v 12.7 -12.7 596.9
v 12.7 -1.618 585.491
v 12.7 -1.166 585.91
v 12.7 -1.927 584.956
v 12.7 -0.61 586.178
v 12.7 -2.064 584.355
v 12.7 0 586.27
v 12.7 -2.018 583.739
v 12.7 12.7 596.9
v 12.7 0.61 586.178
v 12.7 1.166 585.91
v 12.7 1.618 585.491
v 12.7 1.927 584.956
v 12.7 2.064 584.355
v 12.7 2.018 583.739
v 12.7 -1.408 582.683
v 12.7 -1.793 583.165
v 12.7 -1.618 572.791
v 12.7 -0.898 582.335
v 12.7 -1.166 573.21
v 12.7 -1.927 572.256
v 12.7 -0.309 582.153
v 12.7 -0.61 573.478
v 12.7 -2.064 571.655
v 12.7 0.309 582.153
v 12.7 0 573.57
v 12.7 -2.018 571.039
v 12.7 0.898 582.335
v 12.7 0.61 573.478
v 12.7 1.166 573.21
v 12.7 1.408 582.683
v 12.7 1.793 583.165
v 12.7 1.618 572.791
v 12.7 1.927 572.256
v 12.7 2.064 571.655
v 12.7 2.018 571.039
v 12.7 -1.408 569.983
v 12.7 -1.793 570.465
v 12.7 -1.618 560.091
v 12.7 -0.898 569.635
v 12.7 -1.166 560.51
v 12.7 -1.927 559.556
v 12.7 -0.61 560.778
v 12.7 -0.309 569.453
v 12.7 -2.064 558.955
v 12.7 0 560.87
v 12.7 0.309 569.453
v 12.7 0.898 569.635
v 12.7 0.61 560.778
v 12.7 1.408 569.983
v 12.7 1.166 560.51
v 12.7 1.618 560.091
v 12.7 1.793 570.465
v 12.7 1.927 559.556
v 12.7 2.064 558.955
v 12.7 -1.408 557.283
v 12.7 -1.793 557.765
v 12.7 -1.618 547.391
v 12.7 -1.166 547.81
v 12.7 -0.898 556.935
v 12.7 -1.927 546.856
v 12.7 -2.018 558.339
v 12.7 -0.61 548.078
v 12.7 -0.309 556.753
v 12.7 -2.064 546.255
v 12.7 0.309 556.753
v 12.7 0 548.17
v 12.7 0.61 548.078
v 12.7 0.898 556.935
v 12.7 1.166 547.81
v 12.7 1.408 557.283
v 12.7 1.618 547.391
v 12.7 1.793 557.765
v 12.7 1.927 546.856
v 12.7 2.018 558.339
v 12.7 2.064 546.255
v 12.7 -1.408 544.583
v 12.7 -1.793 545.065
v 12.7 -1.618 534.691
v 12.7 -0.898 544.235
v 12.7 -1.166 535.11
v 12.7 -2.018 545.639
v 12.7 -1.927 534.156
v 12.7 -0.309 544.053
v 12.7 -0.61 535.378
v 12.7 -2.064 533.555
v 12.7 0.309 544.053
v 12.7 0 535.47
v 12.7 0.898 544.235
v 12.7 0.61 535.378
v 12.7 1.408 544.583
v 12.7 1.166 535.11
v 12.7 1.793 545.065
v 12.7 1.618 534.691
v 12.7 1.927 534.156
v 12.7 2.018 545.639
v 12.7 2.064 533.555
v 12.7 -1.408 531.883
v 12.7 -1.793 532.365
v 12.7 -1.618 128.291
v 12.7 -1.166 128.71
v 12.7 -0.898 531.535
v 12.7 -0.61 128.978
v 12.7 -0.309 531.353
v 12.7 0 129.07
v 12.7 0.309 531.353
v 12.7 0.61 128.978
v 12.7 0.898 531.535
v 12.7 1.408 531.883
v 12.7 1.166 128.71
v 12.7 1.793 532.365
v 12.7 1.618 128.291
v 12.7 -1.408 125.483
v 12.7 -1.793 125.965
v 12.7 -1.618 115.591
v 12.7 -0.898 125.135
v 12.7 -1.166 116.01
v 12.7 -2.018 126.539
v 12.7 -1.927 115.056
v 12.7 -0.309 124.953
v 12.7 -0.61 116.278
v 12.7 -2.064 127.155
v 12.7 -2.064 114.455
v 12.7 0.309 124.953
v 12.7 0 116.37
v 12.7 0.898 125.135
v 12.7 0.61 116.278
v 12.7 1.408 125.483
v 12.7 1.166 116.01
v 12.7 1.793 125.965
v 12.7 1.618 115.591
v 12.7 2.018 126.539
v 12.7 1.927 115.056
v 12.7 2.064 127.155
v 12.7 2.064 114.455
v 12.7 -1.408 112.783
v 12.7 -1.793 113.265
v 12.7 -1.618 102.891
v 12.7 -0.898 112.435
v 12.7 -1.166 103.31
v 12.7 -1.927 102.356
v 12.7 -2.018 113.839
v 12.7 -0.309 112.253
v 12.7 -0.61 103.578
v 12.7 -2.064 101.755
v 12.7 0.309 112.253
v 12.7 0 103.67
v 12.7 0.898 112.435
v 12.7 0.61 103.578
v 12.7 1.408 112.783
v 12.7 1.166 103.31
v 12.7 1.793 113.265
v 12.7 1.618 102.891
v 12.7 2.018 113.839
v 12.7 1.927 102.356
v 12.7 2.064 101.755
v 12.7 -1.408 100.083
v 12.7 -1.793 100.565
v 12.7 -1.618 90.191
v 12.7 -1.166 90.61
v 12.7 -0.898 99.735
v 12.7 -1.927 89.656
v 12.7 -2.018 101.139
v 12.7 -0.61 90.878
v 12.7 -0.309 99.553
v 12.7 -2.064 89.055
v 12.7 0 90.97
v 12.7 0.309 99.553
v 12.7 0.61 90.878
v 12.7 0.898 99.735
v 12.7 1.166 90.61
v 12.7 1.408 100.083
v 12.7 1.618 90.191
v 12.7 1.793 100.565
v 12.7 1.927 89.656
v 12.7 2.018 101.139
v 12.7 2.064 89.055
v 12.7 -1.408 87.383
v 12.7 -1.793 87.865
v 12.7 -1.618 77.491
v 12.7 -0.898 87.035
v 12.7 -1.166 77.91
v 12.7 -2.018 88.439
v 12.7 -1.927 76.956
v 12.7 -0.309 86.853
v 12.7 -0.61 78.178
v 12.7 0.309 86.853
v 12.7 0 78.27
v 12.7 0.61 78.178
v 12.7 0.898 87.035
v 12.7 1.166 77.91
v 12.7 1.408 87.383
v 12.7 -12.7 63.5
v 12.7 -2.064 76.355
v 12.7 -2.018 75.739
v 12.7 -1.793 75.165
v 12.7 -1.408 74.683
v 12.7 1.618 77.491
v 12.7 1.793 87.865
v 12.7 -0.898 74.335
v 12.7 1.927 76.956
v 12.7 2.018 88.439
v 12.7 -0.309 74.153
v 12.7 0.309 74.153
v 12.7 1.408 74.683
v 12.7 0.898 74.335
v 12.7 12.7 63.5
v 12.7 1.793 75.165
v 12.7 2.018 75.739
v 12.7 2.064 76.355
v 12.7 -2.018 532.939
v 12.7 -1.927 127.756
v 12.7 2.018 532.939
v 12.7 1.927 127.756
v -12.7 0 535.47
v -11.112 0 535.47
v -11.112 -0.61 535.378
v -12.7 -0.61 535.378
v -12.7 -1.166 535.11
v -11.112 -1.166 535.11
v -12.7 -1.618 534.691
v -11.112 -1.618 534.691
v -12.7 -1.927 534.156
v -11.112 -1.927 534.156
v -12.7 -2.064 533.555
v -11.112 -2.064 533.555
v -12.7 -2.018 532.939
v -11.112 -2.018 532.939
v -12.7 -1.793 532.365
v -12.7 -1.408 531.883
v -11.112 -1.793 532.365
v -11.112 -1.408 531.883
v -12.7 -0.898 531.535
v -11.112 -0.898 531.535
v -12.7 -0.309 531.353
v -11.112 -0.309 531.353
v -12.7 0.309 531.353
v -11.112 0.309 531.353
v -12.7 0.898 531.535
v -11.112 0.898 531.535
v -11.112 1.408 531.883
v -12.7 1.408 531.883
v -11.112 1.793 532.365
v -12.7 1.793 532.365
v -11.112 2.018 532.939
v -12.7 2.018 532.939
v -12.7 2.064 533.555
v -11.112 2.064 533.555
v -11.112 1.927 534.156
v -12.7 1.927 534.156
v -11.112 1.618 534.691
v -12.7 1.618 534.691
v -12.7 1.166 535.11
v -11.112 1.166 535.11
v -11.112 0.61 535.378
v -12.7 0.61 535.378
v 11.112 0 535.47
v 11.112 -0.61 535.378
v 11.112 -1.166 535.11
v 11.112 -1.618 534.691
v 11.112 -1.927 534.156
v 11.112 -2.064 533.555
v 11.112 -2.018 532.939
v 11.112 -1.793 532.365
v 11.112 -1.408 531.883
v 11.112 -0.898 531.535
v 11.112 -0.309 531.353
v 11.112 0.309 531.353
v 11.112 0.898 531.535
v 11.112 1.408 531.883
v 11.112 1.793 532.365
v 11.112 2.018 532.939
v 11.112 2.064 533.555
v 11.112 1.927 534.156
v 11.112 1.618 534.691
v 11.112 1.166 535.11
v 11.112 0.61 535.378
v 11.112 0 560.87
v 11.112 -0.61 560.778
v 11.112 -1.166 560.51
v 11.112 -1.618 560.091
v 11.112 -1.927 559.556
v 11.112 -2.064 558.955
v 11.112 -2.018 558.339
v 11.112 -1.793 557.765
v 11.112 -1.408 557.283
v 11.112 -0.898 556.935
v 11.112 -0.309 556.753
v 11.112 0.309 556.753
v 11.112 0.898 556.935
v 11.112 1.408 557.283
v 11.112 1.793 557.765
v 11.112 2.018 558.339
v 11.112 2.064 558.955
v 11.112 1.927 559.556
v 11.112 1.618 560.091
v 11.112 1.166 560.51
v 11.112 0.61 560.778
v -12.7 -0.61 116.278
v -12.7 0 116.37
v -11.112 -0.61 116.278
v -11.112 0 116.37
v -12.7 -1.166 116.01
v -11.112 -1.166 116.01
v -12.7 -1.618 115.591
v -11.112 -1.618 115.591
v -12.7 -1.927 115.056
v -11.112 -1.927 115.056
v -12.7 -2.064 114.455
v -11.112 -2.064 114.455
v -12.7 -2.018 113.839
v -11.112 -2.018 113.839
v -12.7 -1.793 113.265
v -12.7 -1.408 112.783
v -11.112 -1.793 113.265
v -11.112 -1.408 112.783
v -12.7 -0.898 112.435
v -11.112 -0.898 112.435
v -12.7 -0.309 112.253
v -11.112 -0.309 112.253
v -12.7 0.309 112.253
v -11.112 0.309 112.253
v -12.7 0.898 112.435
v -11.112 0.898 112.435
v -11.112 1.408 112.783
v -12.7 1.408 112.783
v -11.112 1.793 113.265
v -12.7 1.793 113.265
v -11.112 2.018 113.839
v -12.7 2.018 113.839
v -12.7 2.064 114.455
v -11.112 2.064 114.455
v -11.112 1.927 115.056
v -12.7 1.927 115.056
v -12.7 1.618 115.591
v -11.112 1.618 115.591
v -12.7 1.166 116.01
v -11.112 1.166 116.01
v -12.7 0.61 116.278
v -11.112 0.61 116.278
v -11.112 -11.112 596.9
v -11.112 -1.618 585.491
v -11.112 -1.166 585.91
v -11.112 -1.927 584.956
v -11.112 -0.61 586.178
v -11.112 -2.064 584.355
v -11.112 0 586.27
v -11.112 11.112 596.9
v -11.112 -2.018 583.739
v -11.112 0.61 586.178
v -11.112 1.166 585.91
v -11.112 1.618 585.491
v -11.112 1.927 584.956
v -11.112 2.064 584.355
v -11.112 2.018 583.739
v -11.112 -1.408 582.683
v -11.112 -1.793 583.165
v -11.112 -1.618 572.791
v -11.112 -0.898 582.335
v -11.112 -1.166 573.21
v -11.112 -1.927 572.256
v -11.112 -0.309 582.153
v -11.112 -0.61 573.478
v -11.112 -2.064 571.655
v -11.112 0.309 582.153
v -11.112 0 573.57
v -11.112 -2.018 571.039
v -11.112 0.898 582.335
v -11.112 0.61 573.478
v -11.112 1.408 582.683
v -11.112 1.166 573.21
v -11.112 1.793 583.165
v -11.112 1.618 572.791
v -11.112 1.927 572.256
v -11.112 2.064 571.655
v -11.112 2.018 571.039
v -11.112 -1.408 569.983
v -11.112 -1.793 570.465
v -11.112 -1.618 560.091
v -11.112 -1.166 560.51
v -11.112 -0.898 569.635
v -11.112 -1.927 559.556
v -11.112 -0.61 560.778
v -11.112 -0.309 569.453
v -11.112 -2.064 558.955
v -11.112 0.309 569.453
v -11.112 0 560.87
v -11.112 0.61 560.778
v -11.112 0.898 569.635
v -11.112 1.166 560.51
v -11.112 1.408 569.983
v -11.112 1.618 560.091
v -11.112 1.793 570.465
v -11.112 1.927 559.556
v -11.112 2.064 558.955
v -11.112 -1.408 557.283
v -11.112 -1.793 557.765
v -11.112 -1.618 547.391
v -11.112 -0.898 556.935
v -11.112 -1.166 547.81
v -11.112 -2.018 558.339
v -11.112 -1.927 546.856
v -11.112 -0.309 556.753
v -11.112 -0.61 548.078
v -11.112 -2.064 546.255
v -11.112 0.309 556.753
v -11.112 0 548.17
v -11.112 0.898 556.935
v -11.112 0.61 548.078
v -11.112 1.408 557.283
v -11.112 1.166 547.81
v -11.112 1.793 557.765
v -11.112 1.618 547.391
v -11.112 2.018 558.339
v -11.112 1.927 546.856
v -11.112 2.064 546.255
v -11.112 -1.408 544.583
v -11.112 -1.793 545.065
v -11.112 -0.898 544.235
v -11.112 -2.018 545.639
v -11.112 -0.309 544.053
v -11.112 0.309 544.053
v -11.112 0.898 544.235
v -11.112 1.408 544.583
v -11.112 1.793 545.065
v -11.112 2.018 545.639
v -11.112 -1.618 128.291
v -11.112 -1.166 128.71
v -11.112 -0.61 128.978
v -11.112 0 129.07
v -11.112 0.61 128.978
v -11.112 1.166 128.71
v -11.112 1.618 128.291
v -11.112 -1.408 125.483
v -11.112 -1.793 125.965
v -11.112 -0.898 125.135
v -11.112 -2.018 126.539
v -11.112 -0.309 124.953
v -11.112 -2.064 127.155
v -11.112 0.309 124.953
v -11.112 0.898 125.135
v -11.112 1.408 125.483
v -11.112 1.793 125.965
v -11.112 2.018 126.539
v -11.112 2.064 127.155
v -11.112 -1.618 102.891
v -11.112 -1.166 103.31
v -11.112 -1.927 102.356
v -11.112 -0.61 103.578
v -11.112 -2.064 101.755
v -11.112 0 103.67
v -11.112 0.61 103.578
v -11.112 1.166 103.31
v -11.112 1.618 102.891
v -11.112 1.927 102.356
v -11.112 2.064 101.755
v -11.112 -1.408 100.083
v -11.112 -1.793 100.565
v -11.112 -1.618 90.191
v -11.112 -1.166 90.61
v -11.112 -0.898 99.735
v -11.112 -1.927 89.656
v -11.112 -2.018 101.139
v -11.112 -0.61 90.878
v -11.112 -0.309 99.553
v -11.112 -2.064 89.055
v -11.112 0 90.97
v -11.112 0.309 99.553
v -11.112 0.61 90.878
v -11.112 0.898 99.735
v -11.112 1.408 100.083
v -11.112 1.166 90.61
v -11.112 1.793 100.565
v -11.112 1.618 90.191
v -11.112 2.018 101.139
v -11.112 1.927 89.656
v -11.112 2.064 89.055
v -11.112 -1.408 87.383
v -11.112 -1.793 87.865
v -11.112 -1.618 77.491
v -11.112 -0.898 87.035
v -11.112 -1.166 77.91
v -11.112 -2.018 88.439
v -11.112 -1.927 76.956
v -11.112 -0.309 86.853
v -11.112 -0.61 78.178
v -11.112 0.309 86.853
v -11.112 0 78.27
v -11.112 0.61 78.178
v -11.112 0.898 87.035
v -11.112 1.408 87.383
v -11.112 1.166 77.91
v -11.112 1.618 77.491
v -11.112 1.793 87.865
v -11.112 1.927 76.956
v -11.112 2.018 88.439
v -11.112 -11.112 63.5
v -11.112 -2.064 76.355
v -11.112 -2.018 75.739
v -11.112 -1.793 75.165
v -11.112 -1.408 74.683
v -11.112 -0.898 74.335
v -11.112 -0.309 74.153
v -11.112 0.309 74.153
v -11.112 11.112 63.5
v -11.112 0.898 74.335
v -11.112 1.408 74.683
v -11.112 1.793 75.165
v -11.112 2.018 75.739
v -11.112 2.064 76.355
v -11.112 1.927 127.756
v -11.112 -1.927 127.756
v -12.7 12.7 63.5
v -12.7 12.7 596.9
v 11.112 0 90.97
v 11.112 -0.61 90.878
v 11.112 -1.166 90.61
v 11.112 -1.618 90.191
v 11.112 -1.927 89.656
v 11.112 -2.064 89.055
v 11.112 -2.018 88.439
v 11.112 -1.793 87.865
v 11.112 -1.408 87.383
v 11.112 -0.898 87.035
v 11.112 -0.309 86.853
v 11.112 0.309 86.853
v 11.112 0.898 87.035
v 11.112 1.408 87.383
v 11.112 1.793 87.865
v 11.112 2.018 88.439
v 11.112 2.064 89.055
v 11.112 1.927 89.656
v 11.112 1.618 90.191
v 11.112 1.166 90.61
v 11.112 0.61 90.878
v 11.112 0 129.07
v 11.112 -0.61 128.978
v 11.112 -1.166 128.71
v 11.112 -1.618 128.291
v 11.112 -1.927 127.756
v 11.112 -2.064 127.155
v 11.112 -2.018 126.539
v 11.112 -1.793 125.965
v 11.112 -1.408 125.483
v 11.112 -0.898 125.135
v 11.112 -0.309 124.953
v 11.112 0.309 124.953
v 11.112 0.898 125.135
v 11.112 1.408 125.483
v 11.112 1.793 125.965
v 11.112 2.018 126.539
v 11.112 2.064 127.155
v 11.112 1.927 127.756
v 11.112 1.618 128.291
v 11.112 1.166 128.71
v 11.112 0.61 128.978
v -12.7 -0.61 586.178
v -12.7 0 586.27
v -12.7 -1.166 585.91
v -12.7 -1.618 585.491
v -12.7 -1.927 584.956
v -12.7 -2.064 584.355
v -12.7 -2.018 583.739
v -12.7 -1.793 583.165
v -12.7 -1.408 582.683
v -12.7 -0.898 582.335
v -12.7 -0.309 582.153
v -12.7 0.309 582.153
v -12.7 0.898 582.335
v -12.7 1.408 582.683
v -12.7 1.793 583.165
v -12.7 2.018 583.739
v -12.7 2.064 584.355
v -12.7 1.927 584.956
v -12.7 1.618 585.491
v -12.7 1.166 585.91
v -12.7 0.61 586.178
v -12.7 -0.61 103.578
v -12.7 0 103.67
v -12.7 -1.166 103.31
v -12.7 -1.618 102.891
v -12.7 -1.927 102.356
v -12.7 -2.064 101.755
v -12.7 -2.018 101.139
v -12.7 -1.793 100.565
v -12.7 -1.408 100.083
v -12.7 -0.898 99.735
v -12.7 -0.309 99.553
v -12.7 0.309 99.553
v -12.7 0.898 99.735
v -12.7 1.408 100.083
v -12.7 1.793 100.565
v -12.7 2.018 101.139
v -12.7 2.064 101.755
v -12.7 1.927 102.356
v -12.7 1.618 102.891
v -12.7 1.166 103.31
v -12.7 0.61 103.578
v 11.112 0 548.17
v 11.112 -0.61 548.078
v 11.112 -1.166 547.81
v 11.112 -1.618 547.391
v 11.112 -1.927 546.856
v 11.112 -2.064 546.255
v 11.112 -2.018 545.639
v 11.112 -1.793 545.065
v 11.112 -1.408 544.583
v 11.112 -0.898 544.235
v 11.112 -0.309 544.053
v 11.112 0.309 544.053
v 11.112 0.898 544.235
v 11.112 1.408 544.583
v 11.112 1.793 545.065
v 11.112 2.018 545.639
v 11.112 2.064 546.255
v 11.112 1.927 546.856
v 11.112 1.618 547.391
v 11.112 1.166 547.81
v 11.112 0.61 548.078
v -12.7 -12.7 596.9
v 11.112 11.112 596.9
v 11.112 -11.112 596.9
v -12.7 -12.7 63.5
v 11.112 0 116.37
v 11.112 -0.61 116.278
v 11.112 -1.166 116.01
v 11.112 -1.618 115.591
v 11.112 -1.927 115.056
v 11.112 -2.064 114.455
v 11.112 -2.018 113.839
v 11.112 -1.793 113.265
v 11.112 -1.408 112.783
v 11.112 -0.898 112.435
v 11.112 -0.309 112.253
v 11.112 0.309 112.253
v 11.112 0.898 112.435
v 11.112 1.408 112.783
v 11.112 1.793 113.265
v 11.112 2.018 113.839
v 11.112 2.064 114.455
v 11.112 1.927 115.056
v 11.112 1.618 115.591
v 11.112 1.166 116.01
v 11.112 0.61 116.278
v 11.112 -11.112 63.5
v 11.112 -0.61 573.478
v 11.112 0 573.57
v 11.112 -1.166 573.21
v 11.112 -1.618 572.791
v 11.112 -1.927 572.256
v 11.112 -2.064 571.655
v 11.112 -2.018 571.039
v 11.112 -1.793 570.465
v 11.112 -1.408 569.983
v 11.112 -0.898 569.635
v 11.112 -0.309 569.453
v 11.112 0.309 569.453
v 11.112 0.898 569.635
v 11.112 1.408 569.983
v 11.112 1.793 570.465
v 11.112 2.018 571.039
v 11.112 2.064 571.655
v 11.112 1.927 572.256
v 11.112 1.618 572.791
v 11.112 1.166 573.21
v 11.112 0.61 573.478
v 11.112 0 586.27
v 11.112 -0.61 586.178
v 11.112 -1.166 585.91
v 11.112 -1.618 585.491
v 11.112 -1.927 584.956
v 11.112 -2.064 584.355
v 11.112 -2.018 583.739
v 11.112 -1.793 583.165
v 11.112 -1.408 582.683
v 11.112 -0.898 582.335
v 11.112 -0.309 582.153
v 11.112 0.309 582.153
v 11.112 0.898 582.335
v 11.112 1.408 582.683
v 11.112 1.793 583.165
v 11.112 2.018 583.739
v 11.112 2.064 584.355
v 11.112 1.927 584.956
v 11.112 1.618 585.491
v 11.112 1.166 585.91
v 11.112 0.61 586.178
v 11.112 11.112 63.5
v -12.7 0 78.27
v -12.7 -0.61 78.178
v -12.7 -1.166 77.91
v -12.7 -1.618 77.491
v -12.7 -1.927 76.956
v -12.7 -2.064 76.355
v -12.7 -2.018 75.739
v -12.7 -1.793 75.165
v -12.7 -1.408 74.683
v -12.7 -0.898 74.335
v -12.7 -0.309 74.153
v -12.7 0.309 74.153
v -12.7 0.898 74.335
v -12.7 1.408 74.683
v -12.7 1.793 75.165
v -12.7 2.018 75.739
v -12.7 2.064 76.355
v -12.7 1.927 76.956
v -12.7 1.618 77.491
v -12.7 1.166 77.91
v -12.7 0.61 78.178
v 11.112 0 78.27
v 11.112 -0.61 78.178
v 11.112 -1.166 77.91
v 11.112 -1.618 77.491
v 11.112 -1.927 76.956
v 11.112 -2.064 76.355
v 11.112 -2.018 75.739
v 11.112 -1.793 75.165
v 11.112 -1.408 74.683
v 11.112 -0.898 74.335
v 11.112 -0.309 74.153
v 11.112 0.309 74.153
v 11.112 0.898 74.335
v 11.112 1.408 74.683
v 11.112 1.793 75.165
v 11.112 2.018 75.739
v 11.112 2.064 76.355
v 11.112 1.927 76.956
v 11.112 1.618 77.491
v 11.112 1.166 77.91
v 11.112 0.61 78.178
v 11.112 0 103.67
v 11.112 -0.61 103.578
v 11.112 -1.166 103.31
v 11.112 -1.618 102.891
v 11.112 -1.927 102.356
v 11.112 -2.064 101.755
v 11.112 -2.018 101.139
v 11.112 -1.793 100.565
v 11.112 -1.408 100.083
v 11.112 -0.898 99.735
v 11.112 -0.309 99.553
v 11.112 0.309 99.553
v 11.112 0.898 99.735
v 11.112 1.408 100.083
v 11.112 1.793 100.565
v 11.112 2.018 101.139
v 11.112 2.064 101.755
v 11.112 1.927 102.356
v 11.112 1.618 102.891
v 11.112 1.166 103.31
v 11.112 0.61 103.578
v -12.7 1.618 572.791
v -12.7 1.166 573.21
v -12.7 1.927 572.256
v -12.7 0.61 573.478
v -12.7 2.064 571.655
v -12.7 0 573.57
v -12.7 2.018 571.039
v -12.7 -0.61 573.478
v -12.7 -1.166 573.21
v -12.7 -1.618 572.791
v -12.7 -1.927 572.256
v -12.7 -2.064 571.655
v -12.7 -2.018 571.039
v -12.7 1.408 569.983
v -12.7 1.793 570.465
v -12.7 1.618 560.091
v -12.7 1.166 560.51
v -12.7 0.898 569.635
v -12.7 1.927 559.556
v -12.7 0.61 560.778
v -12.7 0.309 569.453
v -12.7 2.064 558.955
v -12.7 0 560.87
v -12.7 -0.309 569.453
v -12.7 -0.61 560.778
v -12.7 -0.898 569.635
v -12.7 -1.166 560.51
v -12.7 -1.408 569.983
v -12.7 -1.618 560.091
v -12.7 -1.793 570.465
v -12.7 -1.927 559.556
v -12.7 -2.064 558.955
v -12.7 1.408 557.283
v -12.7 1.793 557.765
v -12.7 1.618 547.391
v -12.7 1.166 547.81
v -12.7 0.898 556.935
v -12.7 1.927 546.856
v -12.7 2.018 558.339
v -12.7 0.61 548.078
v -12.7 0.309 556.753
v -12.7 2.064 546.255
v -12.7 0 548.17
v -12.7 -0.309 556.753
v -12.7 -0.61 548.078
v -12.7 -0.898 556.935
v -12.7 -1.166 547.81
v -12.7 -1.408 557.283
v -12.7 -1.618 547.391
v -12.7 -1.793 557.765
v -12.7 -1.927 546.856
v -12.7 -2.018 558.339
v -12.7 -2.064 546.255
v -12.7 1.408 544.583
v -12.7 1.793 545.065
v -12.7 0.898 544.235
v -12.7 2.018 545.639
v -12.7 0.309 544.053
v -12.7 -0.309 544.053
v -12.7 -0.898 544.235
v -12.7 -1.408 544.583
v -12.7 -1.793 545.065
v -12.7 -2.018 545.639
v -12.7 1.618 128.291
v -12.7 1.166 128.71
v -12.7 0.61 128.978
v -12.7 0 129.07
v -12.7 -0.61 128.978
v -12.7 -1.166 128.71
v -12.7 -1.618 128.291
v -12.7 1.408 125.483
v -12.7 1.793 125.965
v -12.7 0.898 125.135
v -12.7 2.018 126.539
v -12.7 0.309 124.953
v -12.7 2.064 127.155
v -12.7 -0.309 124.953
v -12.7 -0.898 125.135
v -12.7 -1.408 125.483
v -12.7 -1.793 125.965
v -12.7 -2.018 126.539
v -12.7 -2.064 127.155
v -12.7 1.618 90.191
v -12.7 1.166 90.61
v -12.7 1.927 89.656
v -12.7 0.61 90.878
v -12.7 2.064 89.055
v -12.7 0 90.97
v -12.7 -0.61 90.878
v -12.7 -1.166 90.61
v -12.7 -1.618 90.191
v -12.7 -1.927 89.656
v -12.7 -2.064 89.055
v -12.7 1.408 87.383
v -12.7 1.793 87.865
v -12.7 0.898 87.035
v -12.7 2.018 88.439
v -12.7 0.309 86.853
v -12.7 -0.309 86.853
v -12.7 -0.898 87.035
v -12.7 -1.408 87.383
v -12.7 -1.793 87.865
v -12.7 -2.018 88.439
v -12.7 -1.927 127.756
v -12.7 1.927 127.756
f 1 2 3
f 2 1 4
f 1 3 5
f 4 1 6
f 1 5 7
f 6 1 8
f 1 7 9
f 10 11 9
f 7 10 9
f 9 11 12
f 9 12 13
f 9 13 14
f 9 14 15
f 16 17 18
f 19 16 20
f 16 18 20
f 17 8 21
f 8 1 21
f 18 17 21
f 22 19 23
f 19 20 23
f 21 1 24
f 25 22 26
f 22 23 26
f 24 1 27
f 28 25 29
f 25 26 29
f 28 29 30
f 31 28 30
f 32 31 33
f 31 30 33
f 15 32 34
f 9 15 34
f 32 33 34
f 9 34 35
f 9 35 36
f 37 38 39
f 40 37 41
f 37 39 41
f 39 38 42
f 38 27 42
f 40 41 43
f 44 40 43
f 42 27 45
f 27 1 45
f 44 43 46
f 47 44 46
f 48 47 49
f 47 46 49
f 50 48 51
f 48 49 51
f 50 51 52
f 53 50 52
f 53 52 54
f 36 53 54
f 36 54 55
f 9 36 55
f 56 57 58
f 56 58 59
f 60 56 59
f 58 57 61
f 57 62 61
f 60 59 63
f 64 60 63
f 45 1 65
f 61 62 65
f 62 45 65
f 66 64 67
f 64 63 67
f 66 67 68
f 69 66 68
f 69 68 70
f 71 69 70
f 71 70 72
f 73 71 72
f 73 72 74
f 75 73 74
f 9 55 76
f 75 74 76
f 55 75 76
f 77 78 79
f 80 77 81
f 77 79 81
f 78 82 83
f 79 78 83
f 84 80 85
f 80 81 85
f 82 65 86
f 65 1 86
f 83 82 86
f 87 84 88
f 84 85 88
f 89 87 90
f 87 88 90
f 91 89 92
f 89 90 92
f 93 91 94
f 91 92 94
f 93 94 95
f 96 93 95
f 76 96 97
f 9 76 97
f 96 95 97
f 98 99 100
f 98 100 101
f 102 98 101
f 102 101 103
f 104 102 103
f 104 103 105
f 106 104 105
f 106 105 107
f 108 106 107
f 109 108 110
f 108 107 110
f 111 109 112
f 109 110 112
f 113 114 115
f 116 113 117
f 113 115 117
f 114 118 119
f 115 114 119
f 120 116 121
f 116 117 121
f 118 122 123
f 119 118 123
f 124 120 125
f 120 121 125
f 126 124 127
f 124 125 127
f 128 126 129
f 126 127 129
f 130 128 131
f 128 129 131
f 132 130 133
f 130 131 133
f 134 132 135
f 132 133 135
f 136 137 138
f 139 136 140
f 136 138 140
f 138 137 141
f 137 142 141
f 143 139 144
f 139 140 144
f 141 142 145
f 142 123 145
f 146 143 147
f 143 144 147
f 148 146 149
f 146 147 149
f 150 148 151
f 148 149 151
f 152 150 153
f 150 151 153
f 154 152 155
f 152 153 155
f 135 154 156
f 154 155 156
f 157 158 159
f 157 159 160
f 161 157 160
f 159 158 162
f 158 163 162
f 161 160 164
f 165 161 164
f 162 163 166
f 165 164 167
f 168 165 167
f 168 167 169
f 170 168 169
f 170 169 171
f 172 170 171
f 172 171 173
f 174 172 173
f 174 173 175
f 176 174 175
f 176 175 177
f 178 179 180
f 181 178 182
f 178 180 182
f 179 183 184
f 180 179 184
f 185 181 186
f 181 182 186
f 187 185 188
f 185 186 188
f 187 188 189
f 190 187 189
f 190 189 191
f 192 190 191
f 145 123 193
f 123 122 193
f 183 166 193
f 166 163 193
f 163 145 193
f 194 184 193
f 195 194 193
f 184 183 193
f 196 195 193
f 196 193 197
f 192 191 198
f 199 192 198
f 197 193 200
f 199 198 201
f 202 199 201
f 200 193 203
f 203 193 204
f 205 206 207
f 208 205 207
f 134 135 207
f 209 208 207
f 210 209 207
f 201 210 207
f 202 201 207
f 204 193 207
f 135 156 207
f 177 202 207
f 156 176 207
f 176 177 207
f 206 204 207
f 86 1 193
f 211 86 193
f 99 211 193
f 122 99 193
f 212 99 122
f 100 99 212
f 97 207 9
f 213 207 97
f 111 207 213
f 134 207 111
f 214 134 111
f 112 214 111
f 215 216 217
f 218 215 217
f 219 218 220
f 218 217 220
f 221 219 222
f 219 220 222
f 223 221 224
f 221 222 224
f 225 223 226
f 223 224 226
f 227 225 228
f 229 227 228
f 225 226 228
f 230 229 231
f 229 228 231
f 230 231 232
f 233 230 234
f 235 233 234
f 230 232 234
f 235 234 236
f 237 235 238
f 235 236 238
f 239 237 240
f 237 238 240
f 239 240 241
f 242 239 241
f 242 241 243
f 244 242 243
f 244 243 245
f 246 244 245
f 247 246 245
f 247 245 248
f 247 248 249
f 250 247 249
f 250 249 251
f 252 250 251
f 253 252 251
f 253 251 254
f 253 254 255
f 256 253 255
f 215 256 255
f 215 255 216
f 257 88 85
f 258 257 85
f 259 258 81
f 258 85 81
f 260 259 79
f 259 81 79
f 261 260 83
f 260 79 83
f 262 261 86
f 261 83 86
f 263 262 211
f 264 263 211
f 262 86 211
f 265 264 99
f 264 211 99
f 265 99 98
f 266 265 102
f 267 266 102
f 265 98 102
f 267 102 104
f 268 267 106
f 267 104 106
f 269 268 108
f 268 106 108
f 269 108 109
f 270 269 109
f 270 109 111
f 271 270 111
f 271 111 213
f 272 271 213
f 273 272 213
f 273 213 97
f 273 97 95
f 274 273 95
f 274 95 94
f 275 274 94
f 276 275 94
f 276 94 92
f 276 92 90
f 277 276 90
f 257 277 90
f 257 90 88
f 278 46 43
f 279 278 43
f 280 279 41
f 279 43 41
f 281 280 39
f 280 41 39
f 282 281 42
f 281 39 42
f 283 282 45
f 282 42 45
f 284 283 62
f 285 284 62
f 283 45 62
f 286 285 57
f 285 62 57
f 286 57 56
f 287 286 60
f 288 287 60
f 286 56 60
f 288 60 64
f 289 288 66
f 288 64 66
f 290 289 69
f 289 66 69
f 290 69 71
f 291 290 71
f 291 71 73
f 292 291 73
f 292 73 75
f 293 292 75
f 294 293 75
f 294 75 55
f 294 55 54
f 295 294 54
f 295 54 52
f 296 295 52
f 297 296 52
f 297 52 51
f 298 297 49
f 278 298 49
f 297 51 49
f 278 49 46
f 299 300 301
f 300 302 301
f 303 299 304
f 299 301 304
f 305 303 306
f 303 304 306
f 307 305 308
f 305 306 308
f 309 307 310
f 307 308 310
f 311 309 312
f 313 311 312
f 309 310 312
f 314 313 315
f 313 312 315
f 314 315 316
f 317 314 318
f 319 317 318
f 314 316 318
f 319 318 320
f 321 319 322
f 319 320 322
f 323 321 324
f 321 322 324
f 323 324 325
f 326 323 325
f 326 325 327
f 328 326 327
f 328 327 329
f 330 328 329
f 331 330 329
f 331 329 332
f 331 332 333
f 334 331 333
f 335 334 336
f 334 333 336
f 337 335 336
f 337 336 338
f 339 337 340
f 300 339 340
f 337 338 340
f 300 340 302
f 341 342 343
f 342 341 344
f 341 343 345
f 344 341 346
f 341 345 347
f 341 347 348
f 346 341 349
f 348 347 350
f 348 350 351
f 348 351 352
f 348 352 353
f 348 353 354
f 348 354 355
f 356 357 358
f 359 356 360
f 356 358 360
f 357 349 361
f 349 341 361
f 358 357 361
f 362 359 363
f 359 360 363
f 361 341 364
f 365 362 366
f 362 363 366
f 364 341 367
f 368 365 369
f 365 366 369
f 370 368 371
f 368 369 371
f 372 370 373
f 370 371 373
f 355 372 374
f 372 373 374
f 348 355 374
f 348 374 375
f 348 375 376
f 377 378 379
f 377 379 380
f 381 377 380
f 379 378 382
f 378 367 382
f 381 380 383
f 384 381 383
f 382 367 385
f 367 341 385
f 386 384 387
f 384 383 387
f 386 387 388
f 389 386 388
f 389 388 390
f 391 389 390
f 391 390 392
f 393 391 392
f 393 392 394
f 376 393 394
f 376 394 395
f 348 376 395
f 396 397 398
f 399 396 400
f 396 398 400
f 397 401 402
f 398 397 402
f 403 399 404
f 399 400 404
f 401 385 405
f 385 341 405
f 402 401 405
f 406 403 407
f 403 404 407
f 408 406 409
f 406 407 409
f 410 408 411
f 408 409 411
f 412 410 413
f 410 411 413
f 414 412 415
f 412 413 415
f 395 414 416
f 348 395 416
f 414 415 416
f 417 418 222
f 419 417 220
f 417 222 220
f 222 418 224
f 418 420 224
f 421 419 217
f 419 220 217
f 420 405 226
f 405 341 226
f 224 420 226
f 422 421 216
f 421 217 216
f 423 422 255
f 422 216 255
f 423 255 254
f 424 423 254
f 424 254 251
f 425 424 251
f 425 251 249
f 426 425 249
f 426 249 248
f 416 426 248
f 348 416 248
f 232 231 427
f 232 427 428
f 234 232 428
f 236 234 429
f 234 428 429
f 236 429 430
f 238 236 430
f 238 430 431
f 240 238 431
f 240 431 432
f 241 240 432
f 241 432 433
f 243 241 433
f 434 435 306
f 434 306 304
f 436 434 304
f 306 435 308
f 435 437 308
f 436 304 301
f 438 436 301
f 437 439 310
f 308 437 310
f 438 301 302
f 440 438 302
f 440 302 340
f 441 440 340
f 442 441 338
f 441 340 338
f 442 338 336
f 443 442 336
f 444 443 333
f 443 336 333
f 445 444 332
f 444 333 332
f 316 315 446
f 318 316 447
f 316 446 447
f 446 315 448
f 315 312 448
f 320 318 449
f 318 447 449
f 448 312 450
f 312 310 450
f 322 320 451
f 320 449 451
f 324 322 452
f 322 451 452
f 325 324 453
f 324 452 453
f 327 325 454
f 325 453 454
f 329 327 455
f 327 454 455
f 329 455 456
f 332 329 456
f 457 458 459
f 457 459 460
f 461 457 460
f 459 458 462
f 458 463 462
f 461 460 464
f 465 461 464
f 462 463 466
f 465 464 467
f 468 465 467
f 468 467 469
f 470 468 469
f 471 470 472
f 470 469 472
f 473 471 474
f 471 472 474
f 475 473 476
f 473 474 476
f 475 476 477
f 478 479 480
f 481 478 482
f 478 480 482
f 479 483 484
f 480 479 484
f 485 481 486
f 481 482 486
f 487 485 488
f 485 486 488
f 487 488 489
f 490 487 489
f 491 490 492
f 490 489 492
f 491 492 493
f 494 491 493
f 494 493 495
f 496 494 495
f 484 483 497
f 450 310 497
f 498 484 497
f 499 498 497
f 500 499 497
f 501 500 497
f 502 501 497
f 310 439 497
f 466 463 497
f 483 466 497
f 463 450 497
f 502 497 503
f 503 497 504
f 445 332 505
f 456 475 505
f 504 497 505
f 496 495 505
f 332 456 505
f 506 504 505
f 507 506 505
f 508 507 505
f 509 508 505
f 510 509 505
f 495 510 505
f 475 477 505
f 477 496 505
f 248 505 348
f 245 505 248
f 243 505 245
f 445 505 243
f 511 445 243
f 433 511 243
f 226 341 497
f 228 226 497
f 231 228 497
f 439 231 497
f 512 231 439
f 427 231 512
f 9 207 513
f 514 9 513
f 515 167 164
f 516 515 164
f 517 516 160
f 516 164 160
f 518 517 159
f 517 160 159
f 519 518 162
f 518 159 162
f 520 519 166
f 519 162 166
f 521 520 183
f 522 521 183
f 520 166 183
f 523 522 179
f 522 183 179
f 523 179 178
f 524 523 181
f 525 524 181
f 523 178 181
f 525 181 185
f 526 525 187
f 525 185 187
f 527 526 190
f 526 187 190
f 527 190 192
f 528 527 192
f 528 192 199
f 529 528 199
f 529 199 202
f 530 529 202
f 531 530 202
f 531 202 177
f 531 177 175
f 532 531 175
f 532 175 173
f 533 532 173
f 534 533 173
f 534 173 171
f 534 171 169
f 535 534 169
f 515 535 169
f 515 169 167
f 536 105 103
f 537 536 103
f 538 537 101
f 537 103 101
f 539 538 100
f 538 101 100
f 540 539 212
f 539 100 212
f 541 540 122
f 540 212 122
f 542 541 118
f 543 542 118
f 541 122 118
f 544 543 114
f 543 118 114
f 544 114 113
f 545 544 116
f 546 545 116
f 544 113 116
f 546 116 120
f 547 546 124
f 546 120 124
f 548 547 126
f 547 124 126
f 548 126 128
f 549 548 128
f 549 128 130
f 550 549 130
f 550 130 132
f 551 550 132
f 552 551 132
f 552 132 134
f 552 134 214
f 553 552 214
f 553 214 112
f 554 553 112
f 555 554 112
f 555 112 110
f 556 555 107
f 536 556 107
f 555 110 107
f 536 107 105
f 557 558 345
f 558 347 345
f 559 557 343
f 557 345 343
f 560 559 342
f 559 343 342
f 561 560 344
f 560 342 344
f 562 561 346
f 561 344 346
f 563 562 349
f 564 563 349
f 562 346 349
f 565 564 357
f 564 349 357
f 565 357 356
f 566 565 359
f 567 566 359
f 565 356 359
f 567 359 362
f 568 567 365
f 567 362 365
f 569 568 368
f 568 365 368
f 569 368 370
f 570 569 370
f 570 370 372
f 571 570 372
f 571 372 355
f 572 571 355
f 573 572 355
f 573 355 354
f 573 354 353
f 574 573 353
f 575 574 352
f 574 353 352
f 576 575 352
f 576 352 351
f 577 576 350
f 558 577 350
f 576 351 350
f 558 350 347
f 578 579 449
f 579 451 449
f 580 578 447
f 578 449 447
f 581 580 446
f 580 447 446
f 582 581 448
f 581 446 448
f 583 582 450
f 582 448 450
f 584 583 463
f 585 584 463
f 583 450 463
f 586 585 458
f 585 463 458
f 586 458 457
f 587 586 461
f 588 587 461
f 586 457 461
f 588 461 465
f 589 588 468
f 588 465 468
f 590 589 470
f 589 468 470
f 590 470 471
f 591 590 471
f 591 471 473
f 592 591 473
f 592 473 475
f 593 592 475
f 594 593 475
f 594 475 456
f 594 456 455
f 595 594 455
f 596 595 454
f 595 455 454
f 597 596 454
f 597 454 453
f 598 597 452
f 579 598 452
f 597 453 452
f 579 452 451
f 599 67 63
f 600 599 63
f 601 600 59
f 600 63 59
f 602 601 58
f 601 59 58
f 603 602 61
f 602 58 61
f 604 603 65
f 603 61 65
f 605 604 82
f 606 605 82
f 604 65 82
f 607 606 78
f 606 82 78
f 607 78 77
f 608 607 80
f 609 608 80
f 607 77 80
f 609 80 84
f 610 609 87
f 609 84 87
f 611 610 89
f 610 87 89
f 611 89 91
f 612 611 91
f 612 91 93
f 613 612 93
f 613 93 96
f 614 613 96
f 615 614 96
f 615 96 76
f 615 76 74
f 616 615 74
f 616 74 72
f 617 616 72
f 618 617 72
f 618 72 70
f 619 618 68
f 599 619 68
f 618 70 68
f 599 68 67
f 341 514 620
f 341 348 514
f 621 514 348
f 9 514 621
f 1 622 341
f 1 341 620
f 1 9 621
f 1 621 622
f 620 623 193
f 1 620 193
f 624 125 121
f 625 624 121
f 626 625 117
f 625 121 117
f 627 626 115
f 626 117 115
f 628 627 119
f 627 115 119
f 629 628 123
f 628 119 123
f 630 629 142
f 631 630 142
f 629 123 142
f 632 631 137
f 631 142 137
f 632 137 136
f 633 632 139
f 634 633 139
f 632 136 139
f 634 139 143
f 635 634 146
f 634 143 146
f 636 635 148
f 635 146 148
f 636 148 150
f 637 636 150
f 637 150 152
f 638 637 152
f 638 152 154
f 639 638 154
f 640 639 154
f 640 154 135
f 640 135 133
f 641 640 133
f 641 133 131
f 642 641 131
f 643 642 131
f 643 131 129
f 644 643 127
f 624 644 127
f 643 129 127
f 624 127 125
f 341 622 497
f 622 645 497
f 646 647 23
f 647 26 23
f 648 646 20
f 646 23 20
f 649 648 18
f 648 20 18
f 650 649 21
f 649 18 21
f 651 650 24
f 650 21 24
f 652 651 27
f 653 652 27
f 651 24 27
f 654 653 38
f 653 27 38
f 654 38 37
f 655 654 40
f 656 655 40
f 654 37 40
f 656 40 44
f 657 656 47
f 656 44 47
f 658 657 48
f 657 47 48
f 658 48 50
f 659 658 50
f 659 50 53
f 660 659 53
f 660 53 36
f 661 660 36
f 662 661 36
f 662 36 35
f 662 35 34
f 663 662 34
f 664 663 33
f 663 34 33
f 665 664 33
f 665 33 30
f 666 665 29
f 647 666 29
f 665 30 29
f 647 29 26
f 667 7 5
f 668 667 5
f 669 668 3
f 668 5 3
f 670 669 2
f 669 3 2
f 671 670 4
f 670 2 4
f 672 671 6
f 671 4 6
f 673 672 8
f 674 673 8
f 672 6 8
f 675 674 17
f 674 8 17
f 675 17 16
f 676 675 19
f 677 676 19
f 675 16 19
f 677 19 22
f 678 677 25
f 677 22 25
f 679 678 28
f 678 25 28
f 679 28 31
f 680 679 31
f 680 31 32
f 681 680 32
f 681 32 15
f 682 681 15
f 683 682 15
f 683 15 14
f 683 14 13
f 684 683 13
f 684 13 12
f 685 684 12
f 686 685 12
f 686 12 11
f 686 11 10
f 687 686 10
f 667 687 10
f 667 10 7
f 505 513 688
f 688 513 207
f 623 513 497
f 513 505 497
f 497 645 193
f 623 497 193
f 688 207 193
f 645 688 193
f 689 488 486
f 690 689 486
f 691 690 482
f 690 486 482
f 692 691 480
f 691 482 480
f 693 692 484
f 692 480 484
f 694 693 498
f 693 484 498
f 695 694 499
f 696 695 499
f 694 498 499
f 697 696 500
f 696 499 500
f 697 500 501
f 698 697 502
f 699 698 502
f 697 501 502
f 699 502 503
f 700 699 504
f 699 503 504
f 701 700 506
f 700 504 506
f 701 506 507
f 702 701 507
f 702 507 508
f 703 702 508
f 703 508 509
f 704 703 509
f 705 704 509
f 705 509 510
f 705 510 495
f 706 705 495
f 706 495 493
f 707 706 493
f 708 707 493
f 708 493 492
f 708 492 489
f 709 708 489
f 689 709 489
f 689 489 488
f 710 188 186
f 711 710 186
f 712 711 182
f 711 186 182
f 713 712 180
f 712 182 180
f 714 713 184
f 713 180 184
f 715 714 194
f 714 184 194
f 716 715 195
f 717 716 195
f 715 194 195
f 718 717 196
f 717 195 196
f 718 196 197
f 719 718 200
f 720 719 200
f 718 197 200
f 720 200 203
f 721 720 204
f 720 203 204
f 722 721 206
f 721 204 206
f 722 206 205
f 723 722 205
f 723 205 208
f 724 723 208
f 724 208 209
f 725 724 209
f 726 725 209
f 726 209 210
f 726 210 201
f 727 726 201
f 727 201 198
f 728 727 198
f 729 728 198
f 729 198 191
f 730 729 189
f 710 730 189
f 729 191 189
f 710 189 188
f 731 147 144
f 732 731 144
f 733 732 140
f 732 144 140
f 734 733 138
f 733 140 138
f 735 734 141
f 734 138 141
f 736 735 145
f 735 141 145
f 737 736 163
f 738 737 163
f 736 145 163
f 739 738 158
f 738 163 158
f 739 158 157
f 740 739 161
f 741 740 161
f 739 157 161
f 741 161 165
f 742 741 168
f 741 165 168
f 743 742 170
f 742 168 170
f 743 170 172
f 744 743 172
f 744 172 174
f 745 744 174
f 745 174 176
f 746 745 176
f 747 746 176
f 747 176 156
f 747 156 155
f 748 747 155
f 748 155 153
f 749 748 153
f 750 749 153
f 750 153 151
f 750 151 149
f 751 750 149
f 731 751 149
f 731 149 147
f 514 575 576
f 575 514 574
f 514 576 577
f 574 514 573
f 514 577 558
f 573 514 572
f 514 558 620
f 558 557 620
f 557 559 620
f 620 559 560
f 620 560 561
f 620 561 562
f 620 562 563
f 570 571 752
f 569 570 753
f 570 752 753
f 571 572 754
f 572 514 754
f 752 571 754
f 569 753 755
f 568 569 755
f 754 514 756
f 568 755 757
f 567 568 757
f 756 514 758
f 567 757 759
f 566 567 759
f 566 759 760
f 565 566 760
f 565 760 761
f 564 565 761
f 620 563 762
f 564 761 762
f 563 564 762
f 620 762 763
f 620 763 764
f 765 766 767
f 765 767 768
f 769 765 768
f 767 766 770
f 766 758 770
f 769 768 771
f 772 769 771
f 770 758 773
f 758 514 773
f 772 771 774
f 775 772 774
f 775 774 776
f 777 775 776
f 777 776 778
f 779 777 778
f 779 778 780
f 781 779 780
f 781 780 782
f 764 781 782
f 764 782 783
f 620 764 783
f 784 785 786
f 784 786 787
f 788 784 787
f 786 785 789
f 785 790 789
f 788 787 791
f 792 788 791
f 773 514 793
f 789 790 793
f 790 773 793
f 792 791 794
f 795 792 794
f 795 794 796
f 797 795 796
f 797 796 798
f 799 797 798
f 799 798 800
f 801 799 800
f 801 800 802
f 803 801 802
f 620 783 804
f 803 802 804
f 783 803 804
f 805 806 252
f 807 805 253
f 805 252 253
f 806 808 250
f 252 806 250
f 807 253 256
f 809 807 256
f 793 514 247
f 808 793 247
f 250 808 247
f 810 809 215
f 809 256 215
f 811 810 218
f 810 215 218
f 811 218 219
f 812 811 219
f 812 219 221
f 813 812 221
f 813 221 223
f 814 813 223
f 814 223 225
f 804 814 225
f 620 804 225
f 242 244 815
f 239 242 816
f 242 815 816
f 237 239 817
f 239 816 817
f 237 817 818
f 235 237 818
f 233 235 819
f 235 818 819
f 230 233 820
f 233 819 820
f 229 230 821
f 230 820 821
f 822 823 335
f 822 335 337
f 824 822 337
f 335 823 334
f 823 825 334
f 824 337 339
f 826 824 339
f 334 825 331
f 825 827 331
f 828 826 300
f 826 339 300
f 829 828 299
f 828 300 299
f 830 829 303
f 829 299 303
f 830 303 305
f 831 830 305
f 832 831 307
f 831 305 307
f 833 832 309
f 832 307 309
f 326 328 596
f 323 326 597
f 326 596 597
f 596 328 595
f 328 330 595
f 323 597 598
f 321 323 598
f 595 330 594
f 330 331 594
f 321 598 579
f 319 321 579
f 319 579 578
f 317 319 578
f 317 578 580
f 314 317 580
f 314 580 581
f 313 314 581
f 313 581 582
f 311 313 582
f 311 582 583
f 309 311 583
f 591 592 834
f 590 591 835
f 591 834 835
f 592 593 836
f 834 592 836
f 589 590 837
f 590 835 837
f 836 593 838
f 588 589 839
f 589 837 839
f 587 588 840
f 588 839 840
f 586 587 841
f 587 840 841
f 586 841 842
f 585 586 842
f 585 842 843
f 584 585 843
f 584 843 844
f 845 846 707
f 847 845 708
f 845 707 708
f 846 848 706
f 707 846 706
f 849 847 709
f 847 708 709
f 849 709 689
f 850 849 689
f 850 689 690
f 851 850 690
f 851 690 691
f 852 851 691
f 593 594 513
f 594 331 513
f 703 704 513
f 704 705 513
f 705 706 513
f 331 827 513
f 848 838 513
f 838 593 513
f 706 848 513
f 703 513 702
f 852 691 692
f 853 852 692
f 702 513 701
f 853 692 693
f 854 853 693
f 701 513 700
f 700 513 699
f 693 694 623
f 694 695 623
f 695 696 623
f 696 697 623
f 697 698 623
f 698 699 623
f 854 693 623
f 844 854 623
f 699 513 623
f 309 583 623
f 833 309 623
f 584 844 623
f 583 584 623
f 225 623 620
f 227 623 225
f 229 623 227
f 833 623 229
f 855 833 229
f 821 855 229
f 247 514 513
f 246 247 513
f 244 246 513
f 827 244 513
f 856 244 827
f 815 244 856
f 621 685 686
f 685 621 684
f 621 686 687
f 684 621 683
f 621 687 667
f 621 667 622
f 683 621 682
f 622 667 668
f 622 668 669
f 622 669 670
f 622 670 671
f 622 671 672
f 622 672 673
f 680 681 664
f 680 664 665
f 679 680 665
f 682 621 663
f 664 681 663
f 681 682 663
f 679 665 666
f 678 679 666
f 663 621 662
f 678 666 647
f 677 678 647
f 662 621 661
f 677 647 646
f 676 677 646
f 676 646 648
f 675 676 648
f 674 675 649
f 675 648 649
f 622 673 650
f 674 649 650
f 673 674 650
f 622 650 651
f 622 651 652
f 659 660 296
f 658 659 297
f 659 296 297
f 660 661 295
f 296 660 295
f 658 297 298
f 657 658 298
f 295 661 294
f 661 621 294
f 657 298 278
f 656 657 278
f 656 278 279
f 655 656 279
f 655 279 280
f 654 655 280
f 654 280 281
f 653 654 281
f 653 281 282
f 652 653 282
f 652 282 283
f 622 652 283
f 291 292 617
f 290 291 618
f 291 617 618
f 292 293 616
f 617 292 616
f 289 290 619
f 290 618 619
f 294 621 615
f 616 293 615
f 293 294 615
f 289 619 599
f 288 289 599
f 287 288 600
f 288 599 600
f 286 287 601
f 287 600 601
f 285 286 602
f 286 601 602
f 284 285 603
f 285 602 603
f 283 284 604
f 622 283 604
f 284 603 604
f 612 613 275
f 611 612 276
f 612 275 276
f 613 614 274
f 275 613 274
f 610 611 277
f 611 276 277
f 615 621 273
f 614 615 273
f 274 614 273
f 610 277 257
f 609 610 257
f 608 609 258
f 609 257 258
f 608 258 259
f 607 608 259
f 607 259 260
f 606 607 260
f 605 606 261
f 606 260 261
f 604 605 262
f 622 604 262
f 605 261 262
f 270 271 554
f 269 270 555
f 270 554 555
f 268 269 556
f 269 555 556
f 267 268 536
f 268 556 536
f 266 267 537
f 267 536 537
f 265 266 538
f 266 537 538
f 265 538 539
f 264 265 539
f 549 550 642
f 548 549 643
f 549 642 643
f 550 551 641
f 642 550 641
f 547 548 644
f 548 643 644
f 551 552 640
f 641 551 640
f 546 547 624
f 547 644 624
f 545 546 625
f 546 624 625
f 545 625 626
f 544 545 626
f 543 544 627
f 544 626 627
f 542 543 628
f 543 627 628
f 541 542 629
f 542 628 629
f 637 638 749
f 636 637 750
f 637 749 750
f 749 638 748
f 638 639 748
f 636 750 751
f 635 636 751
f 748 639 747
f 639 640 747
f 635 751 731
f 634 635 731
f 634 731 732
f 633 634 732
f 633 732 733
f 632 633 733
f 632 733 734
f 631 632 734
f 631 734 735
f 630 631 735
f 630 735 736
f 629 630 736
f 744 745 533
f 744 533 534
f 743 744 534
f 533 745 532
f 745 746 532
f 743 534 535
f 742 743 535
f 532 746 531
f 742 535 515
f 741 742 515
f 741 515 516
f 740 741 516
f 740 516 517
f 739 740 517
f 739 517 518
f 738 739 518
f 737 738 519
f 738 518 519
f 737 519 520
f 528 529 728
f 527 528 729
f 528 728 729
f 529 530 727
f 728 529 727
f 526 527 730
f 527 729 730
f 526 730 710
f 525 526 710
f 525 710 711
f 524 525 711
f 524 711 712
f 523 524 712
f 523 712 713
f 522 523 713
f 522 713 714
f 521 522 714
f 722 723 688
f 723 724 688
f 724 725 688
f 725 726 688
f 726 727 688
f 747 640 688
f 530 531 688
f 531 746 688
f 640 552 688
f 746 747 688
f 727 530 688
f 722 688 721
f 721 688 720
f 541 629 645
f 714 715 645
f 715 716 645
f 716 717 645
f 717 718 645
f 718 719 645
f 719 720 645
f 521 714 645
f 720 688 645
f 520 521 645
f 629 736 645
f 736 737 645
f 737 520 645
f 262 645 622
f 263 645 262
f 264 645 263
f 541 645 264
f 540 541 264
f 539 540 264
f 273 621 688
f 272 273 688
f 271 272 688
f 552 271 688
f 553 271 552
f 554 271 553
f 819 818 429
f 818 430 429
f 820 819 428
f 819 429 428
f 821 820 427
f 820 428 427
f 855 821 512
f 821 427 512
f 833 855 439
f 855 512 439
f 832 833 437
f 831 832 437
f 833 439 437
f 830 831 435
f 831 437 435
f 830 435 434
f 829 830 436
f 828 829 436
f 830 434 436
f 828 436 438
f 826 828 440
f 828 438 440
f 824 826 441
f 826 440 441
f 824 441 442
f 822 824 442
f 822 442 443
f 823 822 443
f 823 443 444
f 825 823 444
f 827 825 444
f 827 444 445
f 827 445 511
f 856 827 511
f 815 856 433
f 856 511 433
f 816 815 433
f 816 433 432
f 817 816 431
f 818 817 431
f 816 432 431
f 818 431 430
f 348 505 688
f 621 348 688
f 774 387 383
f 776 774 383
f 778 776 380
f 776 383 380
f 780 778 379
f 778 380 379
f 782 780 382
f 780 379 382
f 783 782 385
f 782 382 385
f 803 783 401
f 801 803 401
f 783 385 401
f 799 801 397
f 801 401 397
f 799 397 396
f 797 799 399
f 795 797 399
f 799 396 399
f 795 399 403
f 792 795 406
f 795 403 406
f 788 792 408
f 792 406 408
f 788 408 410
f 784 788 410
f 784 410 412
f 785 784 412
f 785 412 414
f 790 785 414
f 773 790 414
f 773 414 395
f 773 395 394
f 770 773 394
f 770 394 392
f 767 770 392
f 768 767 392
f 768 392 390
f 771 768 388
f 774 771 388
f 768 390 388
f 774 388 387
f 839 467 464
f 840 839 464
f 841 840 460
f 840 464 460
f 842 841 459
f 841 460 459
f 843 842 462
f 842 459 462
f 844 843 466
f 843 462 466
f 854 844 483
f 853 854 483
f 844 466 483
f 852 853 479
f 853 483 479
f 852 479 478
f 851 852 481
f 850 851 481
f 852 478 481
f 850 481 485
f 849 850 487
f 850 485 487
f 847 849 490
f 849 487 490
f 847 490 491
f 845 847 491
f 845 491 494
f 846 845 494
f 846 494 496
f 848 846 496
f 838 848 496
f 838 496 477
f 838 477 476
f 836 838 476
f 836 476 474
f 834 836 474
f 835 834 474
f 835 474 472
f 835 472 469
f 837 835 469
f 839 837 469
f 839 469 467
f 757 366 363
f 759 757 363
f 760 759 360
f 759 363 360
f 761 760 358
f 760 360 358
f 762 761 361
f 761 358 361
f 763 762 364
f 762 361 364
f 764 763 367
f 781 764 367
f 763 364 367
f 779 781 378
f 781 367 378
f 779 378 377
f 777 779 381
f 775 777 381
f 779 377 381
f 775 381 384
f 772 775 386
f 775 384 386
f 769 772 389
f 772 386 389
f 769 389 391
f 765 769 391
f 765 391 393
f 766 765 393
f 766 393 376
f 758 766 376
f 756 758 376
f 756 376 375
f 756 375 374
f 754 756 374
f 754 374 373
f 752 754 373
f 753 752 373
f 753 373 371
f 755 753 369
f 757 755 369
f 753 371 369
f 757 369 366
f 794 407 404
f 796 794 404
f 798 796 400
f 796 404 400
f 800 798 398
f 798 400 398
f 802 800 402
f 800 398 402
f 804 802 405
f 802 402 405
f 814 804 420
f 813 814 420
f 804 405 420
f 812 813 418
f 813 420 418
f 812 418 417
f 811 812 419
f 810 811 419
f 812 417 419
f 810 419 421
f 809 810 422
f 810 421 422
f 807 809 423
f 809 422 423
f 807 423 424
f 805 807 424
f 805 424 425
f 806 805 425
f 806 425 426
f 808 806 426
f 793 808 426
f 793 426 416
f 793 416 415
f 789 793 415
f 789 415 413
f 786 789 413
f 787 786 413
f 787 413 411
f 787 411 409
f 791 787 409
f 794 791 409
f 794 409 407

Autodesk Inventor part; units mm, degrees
ref_plane "YZ Plane" through (0, 0, 0) normal (1, 0, 0) x (0, 1, 0)
ref_plane "XZ Plane" through (0, 0, 0) normal (0, 1, 0) x (-1, 0, 0)
sketch "Sketch1" plane through (0, 0, 0) normal (0, 0, 1) x (1, 0, 0)
  line L0 (-12.7, -12.7) -> (12.7, -12.7)
  line L1 (12.7, -12.7) -> (12.7, 12.7)
  line L2 (12.7, 12.7) -> (-12.7, 12.7)
  line L3 (-12.7, 12.7) -> (-12.7, -12.7)
  line L4 (-12.7, -12.7) -> (12.7, 12.7) construction
  line L5 (12.7, -12.7) -> (-12.7, 12.7) construction
  line L6 (9.525, -9.525) -> (-9.525, -9.525)
  line L7 (-9.525, -9.525) -> (-9.525, 9.525)
  line L8 (-9.525, 9.525) -> (9.525, 9.525)
  line L9 (9.525, 9.525) -> (9.525, -9.525)
  line L10 (9.525, -9.525) -> (-9.525, 9.525) construction
  line L11 (-9.525, -9.525) -> (9.525, 9.525) construction
  point P0 (0, 0)
  dimension "d0" = 25.4
  dimension "d1" = 25.4
  dimension "d6" = 3.175
  dimension "d7" = 3.175
extrude "Extrusion1" add sketch "Sketch1" along normal blind 660.4
sketch "Sketch2" plane through (-12.7, -12.7, 0) normal (-1, 0, 0) x (0, 0, 1)
  line L0 (95.377, -0.127) -> (131.064, -0.127) projected
  line L1 (131.064, -0.127) -> (133.223, 2.032) projected
  line L2 (133.223, 2.032) -> (133.223, 23.114) projected
  line L3 (133.223, 23.114) -> (131.064, 25.273) projected
  line L4 (131.064, 25.273) -> (65.786, 25.273) projected
  line L5 (65.786, 25.273) -> (63.627, 23.114) projected
  line L6 (63.627, 23.114) -> (63.627, -42.164) projected
  line L7 (63.627, -42.164) -> (65.786, -44.323) projected
  line L8 (65.786, -44.323) -> (86.868, -44.323) projected
  line L9 (86.868, -44.323) -> (89.027, -42.164) projected
  line L10 (89.027, -6.477) -> (89.027, -42.164) projected
  arc A0 (95.377, -0.127) -> (89.027, -6.477) centre (95.377, -6.477) ccw projected
  circle A1 centre (127, 12.7) radius 2.0701 projected
  circle A2 centre (76.2, -25.4) radius 2.0701 projected
  circle A3 centre (76.2, 0) radius 2.0701 projected
  circle A4 centre (101.6, 12.7) radius 2.0701 projected
  circle A5 centre (76.2, 12.7) radius 2.0701 projected
  circle A6 centre (88.9, 12.7) radius 2.0701 projected
  circle A7 centre (114.3, 12.7) radius 2.0701 projected
  circle A8 centre (76.2, -12.7) radius 2.0701 projected
  circle A9 centre (76.2, -38.1) radius 2.0701 projected
  line L11 (527.177, 2.032) -> (527.177, 23.114) projected
  line L12 (527.177, 2.032) -> (529.336, -0.127) projected
  line L13 (565.023, -0.127) -> (529.336, -0.127) projected
  arc A10 (571.373, -6.477) -> (565.023, -0.127) centre (565.023, -6.477) ccw projected
  line L14 (571.373, -6.477) -> (571.373, -42.164) projected
  line L15 (571.373, -42.164) -> (573.532, -44.323) projected
  line L16 (594.614, -44.323) -> (573.532, -44.323) projected
  line L17 (594.614, -44.323) -> (596.773, -42.164) projected
  line L18 (596.773, 23.114) -> (596.773, -42.164) projected
  line L19 (596.773, 23.114) -> (594.614, 25.273) projected
  line L20 (529.336, 25.273) -> (594.614, 25.273) projected
  line L21 (529.336, 25.273) -> (527.177, 23.114) projected
  circle A11 centre (533.4, 12.7) radius 2.0701 projected
  circle A12 centre (584.2, -25.4) radius 2.0701 projected
  circle A13 centre (584.2, 0) radius 2.0701 projected
  circle A14 centre (558.8, 12.7) radius 2.0701 projected
  circle A15 centre (584.2, 12.7) radius 2.0701 projected
  circle A16 centre (571.5, 12.7) radius 2.0701 projected
  circle A17 centre (546.1, 12.7) radius 2.0701 projected
  circle A18 centre (584.2, -12.7) radius 2.0701 projected
  circle A19 centre (584.2, -38.1) radius 2.0701 projected
  point P0 (0, 12.7)
hole "Hole1" at (-12.7, 0, 127) at (-12.7, 0, 114.3) at (-12.7, 0, 101.6) at (-12.7, 0, 88.9) at (-12.7, 0, 76.2) at (-12.7, 0, 584.2) at (-12.7, 0, 571.5) at (-12.7, 0, 558.8) at (-12.7, 0, 546.1) at (-12.7, 0, 533.4) direction (1, 0, 0) diameter 4.1402 end through all
sketch "Sketch7" plane through (0, 0, 0) normal (0, 0, -1) x (-1, 0, 0)
  line L0 (9.525, 9.525) -> (9.525, -9.525) projected
  line L1 (9.525, -9.525) -> (-9.525, -9.525) projected
  line L2 (-9.525, -9.525) -> (-9.525, 9.525) projected
  line L3 (-9.525, 9.525) -> (9.525, 9.525) projected
  line L4 (-12.7, 12.7) -> (12.7, 12.7) projected
  line L5 (-11.1125, -11.1125) -> (11.1125, -11.1125)
  line L6 (11.1125, -11.1125) -> (11.1125, 11.1125)
  line L7 (11.1125, 11.1125) -> (-11.1125, 11.1125)
  line L8 (-11.1125, 11.1125) -> (-11.1125, -11.1125)
  line L9 (-11.1125, -11.1125) -> (11.1125, 11.1125) construction
  line L10 (11.1125, -11.1125) -> (-11.1125, 11.1125) construction
  point P0 (0, 0)
  dimension "d33" = 1.5875
extrude "Extrusion5" cut sketch "Sketch7" against normal through all
ref_plane "Work Plane1" through (17.4625, -12.7, 0) normal (1, 0, 0) x (0, 0, -1)
sketch "Sketch9" plane through (12.7, -12.7, 0) normal (1, 0, 0) x (0, 0, -1)
  line L0 (-660.4, 25.4) -> (-596.9, 25.4)
  line L1 (-596.9, 25.4) -> (-596.9, 0)
  line L2 (-596.9, 0) -> (-660.4, 0)
  line L3 (-660.4, 0) -> (-660.4, 25.4)
  line L4 (0, 25.4) -> (-63.5, 25.4)
  line L5 (-63.5, 25.4) -> (-63.5, 0)
  line L6 (-63.5, 0) -> (0, 0)
  line L7 (0, 0) -> (0, 25.4)
  line L8 (0, 0) -> (-660.4, 0) projected
  point P0 (0, 12.7)
  dimension "d42" = 63.5
  dimension "d43" = 63.5
extrude "Extrusion7" cut sketch "Sketch9" against normal through all
properties part number "C24R2_TK_ShooterPivotStock"
